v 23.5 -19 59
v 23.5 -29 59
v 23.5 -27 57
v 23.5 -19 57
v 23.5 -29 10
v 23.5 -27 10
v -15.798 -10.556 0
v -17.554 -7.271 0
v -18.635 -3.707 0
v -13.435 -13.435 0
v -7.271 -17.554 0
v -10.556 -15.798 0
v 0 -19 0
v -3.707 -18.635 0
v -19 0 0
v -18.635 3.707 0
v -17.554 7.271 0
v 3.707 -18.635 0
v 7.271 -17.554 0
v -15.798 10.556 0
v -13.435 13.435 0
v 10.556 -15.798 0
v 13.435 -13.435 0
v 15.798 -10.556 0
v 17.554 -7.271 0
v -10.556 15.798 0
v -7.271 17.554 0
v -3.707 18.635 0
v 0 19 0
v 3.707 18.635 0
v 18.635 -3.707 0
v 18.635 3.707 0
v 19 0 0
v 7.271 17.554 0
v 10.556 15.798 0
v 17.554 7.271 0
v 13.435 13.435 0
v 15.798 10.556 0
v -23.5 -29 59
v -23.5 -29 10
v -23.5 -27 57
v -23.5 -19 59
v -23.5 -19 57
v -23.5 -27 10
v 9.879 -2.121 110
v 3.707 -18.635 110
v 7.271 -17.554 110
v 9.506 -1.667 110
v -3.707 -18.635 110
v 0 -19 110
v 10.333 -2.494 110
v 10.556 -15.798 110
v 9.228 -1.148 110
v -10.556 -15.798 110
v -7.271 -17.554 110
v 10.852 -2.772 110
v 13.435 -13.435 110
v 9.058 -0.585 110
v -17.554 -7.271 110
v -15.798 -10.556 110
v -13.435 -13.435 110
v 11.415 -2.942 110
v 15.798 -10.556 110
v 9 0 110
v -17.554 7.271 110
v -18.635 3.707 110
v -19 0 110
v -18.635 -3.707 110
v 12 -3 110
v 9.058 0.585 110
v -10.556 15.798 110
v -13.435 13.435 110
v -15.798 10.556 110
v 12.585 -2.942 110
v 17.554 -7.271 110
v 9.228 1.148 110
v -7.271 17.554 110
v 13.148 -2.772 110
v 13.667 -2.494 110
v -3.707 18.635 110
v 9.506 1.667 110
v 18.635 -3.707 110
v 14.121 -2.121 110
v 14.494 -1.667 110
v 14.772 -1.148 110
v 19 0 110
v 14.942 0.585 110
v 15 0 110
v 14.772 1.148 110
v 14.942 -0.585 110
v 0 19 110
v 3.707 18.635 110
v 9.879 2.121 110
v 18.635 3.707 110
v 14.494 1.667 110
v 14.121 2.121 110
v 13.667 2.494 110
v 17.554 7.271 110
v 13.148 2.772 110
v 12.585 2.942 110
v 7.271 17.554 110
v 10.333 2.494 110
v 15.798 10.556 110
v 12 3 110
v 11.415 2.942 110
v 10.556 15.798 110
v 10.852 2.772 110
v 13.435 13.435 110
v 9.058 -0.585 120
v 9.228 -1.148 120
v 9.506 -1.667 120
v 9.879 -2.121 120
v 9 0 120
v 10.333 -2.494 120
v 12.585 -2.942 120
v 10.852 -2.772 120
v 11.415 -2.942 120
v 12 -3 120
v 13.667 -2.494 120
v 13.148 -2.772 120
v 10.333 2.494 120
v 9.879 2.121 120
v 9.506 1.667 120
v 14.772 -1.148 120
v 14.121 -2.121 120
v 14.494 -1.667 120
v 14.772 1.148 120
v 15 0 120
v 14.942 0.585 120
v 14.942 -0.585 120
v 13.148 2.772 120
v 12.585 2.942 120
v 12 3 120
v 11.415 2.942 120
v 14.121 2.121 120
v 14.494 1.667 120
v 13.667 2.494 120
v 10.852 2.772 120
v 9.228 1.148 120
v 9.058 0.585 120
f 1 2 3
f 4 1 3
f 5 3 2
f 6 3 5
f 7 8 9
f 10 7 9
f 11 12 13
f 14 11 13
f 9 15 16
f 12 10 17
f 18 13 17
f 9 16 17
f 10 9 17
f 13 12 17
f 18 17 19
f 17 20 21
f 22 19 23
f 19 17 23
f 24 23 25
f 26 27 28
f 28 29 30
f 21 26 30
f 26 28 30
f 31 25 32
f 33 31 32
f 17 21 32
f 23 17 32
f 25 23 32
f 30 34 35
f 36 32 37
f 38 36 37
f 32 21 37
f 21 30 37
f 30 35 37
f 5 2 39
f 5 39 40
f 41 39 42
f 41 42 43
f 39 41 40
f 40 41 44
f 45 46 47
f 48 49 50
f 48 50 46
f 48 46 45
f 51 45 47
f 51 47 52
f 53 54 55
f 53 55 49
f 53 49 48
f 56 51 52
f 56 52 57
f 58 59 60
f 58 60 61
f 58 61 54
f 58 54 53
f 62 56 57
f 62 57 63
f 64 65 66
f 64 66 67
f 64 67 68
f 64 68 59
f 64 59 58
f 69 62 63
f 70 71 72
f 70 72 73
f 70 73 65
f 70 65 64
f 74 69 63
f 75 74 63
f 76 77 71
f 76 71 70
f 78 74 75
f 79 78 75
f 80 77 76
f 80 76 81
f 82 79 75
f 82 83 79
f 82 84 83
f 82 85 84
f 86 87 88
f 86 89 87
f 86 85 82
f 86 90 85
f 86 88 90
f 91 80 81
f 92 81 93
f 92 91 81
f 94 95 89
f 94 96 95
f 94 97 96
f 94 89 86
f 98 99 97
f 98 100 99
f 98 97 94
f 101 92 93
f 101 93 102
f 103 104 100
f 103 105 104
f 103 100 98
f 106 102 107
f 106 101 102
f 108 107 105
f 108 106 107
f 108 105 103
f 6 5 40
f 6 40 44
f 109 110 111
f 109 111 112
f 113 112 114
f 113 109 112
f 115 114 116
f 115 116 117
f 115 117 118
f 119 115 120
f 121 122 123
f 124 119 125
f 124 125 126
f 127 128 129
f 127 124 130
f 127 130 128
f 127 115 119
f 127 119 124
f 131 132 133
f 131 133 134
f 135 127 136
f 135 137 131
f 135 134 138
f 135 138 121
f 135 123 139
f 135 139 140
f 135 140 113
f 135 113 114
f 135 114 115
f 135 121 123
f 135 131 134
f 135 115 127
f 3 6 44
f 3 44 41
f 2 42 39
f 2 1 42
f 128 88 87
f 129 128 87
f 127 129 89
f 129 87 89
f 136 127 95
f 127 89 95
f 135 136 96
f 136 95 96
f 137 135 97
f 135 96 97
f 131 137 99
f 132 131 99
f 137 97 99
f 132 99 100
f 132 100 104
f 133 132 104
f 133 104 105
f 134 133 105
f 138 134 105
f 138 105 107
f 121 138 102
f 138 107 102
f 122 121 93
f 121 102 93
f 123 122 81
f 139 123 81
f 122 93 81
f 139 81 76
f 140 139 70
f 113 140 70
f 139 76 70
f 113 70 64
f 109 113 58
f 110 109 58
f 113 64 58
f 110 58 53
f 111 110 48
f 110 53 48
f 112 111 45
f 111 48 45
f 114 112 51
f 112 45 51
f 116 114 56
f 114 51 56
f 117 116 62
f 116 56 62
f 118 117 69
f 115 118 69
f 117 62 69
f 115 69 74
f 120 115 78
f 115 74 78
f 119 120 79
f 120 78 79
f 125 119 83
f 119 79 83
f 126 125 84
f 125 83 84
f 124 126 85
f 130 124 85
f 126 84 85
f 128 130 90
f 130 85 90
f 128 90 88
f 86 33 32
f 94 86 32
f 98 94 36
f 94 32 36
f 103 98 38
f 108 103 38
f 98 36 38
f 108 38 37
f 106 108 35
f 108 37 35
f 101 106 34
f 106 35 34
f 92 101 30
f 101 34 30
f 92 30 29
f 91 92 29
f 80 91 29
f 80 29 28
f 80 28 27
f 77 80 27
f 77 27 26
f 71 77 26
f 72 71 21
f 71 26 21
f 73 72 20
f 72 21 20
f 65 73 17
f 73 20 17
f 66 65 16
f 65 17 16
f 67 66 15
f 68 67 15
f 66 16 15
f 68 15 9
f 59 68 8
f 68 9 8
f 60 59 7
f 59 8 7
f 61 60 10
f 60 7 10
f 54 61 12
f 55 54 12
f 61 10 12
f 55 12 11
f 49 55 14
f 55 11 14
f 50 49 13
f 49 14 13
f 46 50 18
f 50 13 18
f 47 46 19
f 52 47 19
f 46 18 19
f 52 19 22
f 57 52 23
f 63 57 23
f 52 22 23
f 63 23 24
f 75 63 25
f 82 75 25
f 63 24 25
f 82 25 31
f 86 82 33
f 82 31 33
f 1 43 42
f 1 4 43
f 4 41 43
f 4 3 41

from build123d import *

# Parameters (mm, degrees)
ESQUISSE1_R             = 19
BOSS_EXTRU_1_DEPTH      = 110
ESQUISSE2_R             = 3
BOSS_EXTRU_2_DEPTH      = 10
BOSS_EXTRU_3_DEPTH      = 23.5
BOSS_EXTRU_3_DEPTH_BACK = 23.5


with BuildPart() as part:
    # Esquisse1 → Boss.-Extru.1 (new body)
    with BuildSketch(Plane.XY):
        Circle(ESQUISSE1_R)
    extrude(amount=BOSS_EXTRU_1_DEPTH)

    # Esquisse2 → Boss.-Extru.2 (add)
    with BuildSketch(Plane.XY.offset(110)):
        with Locations((12, 0)):
            Circle(ESQUISSE2_R)
    extrude(amount=BOSS_EXTRU_2_DEPTH)


with BuildPart() as body_2:
    # Esquisse3 → Boss.-Extru.3 (new, two sides: drawn at the far end of the back side and taken through both)
    with BuildSketch(Plane(origin=(0, 0, 0), x_dir=(0, 0, -1), z_dir=(1, 0, 0)).offset(-BOSS_EXTRU_3_DEPTH_BACK)):
        Polygon((-59, -19), (-59, -29), (-10, -29), (-10, -27), (-57, -27), (-57, -19), align=None)
    extrude(amount=BOSS_EXTRU_3_DEPTH + BOSS_EXTRU_3_DEPTH_BACK)


solid = Compound([part.part, body_2.part])
